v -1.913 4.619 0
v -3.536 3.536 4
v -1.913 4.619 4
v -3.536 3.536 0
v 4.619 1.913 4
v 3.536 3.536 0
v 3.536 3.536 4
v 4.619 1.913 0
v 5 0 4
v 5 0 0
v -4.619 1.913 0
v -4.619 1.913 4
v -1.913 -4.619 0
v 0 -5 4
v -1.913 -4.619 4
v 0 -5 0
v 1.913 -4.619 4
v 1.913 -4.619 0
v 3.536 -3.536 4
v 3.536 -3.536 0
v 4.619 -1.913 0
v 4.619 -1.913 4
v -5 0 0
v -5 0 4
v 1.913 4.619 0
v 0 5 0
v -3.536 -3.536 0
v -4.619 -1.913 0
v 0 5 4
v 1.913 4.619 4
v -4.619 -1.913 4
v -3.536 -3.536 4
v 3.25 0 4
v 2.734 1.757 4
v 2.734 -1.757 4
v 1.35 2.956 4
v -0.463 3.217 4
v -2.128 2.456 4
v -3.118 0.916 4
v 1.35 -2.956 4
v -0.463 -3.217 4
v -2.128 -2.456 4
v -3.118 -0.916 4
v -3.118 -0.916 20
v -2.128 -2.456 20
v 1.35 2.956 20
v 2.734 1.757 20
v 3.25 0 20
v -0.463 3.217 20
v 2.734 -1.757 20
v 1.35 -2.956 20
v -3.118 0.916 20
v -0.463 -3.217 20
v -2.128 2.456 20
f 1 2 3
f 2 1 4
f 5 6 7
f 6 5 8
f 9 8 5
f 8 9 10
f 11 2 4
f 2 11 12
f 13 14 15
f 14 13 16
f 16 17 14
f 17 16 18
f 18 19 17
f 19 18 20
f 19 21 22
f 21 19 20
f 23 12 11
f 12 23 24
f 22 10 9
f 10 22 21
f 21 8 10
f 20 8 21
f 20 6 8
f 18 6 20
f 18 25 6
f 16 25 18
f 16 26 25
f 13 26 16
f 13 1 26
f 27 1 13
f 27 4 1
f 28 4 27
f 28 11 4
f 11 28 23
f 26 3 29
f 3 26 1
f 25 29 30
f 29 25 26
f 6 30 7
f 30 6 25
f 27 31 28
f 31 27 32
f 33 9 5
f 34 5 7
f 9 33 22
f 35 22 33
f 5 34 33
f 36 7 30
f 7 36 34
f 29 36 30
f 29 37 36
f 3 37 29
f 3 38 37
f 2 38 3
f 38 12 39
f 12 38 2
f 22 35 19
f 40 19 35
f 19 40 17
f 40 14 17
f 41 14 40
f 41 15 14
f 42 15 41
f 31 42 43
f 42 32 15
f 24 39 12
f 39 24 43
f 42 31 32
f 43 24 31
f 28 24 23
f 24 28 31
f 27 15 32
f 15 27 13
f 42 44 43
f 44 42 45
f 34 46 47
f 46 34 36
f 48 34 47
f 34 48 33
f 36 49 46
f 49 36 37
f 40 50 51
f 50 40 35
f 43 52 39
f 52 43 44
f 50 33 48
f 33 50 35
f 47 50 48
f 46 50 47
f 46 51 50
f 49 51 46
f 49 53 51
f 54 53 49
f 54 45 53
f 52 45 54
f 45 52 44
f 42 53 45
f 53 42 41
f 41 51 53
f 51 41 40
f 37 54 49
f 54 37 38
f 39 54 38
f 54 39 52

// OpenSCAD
module bolt(radius, length) {
	module head(r, l) {
		cylinder(r=r, h=l);
	}

	module shaft(r, l) {
		cylinder(r=r, h=l);
	}

	head(radius, length * 0.2);
	shaft(radius * 0.65, length);
}

bolt(5, 20);
